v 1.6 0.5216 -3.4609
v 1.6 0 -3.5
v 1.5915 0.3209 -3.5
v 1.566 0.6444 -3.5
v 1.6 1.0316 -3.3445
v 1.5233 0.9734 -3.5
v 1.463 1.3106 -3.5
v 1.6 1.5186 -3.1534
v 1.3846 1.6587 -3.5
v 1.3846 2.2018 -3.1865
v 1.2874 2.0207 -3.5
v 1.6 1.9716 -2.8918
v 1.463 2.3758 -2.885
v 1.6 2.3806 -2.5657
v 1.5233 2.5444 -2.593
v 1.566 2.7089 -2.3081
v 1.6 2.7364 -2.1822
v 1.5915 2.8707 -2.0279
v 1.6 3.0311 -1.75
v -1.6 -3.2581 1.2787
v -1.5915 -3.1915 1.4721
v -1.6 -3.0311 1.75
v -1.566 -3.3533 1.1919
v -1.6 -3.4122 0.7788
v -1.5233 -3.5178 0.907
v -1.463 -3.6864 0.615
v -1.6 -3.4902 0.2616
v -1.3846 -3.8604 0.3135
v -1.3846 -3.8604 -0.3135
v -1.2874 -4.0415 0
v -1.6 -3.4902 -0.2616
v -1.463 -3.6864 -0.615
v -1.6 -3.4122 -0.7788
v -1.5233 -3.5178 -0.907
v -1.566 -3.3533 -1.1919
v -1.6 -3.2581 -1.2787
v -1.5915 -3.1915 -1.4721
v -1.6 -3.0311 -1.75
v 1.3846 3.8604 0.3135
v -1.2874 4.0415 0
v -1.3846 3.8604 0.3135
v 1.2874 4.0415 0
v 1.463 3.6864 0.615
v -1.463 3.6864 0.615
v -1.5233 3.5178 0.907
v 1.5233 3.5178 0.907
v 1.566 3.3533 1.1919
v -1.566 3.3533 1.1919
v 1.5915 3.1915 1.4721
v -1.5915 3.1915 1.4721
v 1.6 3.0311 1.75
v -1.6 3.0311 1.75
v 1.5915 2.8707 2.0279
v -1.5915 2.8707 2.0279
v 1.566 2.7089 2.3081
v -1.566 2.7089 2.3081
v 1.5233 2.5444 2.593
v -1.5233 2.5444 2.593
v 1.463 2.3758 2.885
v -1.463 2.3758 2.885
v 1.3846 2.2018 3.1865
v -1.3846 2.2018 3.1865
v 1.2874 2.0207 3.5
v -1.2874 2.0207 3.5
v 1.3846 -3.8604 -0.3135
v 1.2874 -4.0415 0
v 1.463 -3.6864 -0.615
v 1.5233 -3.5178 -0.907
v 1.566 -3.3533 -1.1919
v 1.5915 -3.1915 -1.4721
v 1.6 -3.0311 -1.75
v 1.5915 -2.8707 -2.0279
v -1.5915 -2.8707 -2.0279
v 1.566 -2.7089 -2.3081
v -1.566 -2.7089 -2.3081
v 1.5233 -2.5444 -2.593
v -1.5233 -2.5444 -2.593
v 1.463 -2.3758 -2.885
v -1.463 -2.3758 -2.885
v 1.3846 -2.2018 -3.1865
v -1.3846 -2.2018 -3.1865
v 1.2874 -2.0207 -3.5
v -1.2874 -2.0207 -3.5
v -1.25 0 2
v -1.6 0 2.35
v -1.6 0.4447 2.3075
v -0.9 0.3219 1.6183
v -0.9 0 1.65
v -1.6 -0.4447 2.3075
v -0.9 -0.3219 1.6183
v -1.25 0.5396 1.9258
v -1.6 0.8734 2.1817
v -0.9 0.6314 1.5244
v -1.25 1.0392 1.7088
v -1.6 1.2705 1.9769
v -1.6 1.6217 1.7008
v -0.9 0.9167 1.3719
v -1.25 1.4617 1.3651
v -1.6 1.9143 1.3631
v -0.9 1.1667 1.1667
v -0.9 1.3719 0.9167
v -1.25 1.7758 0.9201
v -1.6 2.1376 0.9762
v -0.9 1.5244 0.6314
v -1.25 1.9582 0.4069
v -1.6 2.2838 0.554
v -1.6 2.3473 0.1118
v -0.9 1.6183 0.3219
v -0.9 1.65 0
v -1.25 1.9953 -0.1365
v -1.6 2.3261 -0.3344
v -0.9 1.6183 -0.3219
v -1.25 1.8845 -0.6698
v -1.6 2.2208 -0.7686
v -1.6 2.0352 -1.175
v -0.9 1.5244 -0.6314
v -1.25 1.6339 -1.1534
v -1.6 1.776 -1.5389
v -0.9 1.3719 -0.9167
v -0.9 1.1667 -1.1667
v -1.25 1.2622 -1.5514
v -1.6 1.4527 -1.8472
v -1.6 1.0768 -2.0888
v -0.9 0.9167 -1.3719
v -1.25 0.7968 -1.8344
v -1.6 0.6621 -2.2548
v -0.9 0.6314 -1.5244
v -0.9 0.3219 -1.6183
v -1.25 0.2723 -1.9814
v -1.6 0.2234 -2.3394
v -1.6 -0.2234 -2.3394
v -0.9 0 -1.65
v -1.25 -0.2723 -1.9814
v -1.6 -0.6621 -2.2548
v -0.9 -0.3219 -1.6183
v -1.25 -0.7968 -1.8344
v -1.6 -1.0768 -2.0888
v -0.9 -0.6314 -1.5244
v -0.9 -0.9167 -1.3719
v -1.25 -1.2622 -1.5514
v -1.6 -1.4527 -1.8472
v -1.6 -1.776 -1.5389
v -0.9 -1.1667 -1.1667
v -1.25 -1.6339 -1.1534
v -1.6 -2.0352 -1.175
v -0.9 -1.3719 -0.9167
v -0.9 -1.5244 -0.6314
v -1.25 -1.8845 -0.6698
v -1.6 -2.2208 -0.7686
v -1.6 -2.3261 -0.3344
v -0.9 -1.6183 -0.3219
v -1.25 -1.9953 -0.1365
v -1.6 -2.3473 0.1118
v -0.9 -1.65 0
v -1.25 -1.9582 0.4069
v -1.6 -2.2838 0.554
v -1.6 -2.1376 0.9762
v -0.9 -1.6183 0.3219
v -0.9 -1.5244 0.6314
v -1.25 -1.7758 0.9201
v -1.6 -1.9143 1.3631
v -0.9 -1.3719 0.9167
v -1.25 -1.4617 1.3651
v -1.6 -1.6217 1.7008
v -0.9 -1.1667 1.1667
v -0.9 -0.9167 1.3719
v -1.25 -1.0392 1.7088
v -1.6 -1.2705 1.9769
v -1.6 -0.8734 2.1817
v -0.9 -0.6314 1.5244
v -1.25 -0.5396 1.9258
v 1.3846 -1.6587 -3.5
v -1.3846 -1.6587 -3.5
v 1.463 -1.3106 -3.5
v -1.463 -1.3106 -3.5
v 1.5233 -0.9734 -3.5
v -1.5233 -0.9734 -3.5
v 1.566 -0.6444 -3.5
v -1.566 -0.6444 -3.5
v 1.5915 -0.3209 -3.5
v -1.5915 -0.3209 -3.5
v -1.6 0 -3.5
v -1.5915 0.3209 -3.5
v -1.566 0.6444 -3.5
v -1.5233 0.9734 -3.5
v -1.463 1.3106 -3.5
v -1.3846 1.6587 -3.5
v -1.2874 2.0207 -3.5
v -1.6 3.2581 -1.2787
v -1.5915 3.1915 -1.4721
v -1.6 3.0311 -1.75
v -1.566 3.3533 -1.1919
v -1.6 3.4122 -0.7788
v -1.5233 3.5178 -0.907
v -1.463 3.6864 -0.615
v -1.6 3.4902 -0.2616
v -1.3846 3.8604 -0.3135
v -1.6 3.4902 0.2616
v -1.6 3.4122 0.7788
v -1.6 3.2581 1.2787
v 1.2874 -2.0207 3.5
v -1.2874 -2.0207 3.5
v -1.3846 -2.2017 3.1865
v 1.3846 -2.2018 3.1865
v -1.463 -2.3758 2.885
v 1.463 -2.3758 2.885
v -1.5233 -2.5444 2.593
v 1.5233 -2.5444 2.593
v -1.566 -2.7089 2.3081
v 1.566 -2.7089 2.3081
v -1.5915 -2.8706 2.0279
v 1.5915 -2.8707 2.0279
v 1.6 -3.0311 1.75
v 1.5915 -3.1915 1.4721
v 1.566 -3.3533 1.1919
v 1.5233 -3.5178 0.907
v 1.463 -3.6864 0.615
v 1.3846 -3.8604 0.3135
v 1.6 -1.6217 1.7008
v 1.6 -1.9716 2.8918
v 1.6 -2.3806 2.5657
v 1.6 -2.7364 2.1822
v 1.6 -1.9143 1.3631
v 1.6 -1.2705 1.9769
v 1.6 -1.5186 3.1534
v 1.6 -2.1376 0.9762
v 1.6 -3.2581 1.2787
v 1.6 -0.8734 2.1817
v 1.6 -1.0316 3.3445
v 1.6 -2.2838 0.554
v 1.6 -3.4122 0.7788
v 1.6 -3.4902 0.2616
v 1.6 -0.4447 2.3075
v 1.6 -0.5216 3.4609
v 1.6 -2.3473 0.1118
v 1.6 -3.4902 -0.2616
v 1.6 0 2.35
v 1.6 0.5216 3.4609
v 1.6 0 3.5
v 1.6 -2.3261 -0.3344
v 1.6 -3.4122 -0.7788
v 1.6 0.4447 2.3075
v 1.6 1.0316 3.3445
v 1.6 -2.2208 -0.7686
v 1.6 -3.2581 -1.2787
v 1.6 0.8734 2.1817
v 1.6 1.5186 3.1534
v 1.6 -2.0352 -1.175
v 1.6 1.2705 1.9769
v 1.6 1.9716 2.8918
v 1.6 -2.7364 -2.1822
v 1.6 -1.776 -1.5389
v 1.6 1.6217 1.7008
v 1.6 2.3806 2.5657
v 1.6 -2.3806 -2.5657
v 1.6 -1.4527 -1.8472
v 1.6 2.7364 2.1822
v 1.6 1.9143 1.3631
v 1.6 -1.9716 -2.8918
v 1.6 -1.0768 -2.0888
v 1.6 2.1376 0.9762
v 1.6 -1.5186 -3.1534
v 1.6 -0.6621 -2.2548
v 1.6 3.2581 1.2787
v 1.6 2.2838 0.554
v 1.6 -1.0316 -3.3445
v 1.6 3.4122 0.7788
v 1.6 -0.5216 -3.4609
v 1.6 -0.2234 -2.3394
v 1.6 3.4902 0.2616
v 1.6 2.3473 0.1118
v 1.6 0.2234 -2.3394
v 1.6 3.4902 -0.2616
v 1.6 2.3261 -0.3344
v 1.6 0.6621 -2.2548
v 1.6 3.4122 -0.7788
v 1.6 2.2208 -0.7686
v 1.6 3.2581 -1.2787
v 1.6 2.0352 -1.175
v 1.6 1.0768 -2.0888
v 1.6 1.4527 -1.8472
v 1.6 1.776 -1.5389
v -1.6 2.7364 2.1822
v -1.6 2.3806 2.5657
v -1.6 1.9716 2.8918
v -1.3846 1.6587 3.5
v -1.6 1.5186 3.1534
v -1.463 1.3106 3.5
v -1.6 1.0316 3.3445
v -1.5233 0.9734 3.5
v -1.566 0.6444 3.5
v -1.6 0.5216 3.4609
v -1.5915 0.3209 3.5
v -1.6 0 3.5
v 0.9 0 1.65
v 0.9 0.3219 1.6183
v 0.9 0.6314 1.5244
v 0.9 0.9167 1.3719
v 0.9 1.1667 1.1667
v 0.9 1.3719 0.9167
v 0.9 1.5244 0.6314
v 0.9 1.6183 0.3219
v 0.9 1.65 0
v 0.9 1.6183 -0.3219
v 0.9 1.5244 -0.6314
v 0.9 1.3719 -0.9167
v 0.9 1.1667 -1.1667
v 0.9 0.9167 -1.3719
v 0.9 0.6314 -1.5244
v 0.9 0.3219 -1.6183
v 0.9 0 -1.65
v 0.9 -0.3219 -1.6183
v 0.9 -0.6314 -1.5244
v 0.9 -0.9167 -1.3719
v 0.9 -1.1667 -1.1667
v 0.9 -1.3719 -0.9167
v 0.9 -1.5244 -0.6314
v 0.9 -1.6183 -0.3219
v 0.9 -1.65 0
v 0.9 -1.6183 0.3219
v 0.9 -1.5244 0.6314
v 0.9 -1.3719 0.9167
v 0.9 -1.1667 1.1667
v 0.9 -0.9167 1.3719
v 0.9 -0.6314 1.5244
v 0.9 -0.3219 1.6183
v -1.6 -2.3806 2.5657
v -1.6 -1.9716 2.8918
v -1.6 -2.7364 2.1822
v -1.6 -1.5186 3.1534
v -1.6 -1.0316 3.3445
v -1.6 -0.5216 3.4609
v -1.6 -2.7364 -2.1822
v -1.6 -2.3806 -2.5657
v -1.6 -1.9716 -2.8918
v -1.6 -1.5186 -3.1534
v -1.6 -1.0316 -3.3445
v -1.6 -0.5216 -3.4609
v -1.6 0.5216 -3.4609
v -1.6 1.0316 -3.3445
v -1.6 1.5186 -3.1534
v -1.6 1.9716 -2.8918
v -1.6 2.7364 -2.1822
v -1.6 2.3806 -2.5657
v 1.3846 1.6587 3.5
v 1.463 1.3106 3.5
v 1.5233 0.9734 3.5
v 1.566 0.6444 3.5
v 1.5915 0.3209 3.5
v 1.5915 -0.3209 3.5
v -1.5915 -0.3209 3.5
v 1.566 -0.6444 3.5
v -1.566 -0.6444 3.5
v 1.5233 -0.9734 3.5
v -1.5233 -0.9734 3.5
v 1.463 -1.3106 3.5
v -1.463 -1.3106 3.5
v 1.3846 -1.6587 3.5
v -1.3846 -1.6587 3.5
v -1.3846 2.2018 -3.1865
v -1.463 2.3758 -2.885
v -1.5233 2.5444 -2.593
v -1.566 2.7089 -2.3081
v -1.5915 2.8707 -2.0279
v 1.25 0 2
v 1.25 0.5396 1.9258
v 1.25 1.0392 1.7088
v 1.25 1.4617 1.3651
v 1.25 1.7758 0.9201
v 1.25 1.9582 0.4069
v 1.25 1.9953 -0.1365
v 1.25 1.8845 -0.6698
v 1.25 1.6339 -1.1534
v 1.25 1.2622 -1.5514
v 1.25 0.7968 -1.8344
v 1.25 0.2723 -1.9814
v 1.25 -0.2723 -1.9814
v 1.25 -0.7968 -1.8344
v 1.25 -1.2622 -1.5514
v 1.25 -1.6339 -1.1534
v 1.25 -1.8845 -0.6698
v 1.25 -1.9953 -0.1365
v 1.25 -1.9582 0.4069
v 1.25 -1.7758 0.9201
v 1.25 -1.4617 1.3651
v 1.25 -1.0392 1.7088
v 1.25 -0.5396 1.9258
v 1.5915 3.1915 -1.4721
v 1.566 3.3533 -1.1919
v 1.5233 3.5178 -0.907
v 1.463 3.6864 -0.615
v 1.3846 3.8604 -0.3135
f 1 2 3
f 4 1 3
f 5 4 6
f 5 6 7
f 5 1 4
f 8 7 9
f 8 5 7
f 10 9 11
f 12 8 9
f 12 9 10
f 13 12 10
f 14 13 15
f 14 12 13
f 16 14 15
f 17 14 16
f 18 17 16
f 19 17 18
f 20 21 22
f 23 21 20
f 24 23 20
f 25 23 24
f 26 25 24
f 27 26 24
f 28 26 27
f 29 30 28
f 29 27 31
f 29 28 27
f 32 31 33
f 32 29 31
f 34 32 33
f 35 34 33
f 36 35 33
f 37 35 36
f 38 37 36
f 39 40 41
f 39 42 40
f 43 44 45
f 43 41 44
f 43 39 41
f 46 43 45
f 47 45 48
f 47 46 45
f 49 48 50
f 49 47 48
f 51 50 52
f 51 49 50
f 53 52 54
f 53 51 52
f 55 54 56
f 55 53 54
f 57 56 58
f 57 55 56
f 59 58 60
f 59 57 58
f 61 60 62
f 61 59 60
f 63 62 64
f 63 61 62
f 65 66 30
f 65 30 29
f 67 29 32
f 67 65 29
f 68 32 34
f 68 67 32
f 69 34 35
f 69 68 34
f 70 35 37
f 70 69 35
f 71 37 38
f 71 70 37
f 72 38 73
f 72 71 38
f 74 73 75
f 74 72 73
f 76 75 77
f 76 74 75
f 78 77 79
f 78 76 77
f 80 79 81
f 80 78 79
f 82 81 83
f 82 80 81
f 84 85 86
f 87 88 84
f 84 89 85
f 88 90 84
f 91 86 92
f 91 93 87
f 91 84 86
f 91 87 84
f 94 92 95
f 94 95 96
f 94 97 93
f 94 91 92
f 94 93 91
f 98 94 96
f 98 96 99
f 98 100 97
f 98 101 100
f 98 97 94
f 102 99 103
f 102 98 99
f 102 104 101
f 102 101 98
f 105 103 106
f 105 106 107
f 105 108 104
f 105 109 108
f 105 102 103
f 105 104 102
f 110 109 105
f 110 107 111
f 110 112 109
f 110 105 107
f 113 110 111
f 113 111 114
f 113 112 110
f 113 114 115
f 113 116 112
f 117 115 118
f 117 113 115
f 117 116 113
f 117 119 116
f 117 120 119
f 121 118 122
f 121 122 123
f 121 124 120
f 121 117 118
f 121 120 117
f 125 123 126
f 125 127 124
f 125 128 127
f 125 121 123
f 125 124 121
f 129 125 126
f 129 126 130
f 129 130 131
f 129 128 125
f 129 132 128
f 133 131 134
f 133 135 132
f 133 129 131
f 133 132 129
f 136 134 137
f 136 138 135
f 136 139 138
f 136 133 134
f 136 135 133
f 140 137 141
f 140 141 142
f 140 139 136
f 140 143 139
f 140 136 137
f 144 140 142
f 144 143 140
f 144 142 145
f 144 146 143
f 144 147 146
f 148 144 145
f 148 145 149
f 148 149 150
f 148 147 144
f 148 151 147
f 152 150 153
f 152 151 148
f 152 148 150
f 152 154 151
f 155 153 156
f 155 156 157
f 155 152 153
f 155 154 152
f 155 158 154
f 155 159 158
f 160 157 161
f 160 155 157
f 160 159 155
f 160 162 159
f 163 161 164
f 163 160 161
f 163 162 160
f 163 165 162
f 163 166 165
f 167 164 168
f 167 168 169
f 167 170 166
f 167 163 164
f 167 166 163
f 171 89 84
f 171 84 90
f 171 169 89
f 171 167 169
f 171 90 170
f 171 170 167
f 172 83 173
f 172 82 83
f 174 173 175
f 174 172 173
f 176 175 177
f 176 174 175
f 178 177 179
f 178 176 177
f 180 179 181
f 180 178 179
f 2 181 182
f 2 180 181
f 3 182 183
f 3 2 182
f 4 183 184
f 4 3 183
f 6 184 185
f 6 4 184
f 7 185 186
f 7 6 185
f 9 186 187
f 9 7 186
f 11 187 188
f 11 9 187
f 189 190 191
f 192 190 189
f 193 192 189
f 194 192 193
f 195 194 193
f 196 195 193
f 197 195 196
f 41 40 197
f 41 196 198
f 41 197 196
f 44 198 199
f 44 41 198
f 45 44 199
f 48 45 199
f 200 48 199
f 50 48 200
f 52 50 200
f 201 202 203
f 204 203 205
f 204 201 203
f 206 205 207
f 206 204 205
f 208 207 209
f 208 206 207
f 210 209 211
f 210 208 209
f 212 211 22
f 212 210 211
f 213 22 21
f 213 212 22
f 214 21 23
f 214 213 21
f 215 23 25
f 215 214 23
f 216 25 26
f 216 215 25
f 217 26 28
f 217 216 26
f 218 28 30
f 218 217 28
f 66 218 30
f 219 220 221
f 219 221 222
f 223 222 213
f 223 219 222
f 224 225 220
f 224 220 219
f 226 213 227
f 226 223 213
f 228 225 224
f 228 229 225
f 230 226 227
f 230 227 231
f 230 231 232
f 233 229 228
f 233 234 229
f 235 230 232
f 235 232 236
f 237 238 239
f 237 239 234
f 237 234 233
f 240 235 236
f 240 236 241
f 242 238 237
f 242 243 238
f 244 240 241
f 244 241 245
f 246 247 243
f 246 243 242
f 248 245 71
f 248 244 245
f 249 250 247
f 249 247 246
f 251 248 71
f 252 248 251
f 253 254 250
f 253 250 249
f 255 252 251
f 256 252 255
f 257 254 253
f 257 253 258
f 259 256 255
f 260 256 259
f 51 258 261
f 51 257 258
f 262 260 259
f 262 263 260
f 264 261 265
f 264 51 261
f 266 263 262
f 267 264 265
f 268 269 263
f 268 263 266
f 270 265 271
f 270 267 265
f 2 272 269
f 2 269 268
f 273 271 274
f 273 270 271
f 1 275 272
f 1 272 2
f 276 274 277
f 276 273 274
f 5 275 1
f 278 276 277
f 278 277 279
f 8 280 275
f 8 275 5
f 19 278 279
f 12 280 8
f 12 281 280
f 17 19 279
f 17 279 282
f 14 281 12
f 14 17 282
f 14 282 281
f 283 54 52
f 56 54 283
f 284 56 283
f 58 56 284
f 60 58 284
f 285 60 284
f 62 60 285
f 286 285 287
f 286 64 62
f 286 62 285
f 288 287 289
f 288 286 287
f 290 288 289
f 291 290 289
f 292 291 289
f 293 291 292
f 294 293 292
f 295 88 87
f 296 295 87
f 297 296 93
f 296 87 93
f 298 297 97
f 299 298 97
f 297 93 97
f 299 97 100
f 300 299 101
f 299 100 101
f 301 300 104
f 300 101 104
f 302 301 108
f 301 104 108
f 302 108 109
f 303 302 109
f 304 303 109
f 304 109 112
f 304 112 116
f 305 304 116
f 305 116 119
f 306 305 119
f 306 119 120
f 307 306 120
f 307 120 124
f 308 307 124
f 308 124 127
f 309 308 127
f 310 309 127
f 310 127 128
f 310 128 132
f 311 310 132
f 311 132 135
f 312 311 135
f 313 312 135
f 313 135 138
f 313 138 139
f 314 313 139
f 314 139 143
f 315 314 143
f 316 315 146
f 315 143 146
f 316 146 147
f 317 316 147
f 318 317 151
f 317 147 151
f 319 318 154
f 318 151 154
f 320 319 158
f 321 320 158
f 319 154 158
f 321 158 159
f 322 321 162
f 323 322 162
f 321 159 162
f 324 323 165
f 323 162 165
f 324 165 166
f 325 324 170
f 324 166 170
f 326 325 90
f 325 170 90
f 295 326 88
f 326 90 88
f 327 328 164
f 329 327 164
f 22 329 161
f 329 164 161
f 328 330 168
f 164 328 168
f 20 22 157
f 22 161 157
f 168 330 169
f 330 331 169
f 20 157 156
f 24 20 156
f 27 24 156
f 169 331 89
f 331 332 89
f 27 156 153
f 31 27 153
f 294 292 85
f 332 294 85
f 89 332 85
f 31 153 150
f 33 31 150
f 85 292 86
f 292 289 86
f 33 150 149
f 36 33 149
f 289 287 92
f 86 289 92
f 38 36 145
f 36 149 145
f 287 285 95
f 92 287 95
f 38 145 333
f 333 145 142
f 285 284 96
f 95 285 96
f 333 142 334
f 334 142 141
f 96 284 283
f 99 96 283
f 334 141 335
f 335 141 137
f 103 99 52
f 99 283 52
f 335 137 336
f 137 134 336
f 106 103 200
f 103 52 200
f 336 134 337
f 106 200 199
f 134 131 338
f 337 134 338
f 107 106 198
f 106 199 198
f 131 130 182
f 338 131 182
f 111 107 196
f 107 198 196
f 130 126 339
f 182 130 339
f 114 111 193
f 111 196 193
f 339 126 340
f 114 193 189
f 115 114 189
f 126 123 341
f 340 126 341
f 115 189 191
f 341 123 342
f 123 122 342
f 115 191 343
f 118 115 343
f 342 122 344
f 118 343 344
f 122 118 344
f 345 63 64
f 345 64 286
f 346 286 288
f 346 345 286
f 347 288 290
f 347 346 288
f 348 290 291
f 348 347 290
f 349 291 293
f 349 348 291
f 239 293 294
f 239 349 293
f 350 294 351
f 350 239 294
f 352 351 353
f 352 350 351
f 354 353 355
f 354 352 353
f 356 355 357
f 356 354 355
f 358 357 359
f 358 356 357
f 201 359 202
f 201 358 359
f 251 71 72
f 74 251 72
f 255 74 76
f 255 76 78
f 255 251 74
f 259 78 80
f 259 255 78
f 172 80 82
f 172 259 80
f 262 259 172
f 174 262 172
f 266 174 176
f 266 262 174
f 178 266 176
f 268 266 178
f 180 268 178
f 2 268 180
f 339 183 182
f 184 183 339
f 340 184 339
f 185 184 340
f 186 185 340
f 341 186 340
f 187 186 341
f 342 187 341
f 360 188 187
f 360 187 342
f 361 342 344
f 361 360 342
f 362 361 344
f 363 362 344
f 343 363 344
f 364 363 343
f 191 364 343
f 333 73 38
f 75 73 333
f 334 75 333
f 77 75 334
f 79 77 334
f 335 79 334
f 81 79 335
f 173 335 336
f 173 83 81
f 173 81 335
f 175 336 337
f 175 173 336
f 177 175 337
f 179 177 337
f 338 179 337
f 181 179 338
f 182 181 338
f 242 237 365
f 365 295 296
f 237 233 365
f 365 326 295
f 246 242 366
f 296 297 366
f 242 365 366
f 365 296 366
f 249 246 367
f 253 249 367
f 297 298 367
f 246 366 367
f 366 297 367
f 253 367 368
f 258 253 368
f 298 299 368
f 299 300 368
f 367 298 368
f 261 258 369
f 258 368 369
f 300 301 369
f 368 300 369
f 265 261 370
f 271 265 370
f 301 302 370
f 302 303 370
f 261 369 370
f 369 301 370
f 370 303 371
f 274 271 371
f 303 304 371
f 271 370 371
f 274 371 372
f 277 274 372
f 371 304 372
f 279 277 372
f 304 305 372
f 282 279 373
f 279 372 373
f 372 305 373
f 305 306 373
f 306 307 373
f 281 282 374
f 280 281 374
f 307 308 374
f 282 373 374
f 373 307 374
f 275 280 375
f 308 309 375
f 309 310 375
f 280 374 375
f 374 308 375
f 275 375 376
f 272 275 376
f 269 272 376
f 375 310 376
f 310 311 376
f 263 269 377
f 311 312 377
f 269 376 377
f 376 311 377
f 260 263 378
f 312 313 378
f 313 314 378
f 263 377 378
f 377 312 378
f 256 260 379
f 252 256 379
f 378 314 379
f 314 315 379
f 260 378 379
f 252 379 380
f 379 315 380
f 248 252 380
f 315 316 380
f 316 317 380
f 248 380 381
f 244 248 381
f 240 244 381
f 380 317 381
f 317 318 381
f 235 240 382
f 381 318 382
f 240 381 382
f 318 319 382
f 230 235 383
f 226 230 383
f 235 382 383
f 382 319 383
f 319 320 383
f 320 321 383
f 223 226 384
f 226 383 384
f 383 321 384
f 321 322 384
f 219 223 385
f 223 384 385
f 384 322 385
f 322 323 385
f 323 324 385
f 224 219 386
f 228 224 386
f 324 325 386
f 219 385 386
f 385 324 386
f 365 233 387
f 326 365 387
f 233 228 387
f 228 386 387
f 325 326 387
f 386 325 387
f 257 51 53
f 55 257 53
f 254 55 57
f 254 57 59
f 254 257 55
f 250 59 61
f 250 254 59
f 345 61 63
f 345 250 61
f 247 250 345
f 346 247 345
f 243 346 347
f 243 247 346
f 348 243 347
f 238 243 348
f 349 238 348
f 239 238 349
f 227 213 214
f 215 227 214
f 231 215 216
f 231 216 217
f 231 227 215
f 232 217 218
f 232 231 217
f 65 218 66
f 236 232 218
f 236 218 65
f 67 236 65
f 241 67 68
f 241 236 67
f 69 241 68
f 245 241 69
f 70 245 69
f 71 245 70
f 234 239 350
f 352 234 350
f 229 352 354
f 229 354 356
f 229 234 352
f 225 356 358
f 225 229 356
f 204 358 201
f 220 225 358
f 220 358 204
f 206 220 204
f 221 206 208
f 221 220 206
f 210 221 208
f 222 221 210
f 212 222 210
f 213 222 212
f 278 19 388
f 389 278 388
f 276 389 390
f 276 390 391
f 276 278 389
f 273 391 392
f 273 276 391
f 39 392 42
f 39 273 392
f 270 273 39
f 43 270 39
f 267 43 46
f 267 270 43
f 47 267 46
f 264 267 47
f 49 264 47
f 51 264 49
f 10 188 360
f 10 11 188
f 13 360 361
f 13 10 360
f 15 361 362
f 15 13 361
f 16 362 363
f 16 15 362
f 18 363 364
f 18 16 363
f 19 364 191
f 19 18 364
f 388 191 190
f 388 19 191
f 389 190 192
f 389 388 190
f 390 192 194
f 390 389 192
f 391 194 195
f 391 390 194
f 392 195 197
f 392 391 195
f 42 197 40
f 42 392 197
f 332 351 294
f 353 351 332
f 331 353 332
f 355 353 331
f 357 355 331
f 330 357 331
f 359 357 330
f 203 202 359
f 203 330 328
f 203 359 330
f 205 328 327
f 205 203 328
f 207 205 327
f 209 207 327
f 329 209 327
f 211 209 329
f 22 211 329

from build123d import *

# Parameters (mm, degrees)
EXTRUDE_M_DEPTH     = 1.6
HOLE_WIZARD_D_D     = 3.3
HOLE_WIZARD_D_DEPTH = 3.2
CHAMFER1_SIZE       = 0.7


with BuildPart() as part:
    # Sketch1 → Extrude m (new body, symmetric)
    with BuildSketch(Plane(origin=(0, 0, 0), x_dir=(0, 0, -1), z_dir=(1, 0, 0))):
        Polygon((0, 4.041451884), (-3.5, 2.020725942), (-3.5, -2.020725942), (0, -4.041451884), (3.5, -2.020725942), (3.5, 2.020725942), align=None)
    extrude(amount=EXTRUDE_M_DEPTH, both=True)

    # Sketch2 → Cut-Revolve1 (revolve, cut)
    with BuildSketch(Plane.XY):
        Polygon((1.6, 4.041451884), (1.287392609, 4.041451884), (1.6, 3.5), align=None)
        Polygon((-1.6, 4.041451884), (-1.6, 3.5), (-1.287392609, 4.041451884), align=None)
    revolve(axis=Axis((0, 0, 0), (1, 0, 0)), mode=Mode.SUBTRACT)

    # Hole Wizard d
    with Locations(Plane(origin=(1.6, 0, 0), x_dir=(0, 0, -1), z_dir=(1, 0, 0))):
        with Locations((0, 0)):
            Hole(HOLE_WIZARD_D_D / 2, depth=HOLE_WIZARD_D_DEPTH)

    # Chamfer1
    chamfer1_edges = [part.edges().sort_by_distance(p)[0] for p in [
        (1.6, 0, -1.65),
        (-1.6, 0, -1.65),
    ]]
    chamfer(chamfer1_edges, length=CHAMFER1_SIZE)


solid = part.part
